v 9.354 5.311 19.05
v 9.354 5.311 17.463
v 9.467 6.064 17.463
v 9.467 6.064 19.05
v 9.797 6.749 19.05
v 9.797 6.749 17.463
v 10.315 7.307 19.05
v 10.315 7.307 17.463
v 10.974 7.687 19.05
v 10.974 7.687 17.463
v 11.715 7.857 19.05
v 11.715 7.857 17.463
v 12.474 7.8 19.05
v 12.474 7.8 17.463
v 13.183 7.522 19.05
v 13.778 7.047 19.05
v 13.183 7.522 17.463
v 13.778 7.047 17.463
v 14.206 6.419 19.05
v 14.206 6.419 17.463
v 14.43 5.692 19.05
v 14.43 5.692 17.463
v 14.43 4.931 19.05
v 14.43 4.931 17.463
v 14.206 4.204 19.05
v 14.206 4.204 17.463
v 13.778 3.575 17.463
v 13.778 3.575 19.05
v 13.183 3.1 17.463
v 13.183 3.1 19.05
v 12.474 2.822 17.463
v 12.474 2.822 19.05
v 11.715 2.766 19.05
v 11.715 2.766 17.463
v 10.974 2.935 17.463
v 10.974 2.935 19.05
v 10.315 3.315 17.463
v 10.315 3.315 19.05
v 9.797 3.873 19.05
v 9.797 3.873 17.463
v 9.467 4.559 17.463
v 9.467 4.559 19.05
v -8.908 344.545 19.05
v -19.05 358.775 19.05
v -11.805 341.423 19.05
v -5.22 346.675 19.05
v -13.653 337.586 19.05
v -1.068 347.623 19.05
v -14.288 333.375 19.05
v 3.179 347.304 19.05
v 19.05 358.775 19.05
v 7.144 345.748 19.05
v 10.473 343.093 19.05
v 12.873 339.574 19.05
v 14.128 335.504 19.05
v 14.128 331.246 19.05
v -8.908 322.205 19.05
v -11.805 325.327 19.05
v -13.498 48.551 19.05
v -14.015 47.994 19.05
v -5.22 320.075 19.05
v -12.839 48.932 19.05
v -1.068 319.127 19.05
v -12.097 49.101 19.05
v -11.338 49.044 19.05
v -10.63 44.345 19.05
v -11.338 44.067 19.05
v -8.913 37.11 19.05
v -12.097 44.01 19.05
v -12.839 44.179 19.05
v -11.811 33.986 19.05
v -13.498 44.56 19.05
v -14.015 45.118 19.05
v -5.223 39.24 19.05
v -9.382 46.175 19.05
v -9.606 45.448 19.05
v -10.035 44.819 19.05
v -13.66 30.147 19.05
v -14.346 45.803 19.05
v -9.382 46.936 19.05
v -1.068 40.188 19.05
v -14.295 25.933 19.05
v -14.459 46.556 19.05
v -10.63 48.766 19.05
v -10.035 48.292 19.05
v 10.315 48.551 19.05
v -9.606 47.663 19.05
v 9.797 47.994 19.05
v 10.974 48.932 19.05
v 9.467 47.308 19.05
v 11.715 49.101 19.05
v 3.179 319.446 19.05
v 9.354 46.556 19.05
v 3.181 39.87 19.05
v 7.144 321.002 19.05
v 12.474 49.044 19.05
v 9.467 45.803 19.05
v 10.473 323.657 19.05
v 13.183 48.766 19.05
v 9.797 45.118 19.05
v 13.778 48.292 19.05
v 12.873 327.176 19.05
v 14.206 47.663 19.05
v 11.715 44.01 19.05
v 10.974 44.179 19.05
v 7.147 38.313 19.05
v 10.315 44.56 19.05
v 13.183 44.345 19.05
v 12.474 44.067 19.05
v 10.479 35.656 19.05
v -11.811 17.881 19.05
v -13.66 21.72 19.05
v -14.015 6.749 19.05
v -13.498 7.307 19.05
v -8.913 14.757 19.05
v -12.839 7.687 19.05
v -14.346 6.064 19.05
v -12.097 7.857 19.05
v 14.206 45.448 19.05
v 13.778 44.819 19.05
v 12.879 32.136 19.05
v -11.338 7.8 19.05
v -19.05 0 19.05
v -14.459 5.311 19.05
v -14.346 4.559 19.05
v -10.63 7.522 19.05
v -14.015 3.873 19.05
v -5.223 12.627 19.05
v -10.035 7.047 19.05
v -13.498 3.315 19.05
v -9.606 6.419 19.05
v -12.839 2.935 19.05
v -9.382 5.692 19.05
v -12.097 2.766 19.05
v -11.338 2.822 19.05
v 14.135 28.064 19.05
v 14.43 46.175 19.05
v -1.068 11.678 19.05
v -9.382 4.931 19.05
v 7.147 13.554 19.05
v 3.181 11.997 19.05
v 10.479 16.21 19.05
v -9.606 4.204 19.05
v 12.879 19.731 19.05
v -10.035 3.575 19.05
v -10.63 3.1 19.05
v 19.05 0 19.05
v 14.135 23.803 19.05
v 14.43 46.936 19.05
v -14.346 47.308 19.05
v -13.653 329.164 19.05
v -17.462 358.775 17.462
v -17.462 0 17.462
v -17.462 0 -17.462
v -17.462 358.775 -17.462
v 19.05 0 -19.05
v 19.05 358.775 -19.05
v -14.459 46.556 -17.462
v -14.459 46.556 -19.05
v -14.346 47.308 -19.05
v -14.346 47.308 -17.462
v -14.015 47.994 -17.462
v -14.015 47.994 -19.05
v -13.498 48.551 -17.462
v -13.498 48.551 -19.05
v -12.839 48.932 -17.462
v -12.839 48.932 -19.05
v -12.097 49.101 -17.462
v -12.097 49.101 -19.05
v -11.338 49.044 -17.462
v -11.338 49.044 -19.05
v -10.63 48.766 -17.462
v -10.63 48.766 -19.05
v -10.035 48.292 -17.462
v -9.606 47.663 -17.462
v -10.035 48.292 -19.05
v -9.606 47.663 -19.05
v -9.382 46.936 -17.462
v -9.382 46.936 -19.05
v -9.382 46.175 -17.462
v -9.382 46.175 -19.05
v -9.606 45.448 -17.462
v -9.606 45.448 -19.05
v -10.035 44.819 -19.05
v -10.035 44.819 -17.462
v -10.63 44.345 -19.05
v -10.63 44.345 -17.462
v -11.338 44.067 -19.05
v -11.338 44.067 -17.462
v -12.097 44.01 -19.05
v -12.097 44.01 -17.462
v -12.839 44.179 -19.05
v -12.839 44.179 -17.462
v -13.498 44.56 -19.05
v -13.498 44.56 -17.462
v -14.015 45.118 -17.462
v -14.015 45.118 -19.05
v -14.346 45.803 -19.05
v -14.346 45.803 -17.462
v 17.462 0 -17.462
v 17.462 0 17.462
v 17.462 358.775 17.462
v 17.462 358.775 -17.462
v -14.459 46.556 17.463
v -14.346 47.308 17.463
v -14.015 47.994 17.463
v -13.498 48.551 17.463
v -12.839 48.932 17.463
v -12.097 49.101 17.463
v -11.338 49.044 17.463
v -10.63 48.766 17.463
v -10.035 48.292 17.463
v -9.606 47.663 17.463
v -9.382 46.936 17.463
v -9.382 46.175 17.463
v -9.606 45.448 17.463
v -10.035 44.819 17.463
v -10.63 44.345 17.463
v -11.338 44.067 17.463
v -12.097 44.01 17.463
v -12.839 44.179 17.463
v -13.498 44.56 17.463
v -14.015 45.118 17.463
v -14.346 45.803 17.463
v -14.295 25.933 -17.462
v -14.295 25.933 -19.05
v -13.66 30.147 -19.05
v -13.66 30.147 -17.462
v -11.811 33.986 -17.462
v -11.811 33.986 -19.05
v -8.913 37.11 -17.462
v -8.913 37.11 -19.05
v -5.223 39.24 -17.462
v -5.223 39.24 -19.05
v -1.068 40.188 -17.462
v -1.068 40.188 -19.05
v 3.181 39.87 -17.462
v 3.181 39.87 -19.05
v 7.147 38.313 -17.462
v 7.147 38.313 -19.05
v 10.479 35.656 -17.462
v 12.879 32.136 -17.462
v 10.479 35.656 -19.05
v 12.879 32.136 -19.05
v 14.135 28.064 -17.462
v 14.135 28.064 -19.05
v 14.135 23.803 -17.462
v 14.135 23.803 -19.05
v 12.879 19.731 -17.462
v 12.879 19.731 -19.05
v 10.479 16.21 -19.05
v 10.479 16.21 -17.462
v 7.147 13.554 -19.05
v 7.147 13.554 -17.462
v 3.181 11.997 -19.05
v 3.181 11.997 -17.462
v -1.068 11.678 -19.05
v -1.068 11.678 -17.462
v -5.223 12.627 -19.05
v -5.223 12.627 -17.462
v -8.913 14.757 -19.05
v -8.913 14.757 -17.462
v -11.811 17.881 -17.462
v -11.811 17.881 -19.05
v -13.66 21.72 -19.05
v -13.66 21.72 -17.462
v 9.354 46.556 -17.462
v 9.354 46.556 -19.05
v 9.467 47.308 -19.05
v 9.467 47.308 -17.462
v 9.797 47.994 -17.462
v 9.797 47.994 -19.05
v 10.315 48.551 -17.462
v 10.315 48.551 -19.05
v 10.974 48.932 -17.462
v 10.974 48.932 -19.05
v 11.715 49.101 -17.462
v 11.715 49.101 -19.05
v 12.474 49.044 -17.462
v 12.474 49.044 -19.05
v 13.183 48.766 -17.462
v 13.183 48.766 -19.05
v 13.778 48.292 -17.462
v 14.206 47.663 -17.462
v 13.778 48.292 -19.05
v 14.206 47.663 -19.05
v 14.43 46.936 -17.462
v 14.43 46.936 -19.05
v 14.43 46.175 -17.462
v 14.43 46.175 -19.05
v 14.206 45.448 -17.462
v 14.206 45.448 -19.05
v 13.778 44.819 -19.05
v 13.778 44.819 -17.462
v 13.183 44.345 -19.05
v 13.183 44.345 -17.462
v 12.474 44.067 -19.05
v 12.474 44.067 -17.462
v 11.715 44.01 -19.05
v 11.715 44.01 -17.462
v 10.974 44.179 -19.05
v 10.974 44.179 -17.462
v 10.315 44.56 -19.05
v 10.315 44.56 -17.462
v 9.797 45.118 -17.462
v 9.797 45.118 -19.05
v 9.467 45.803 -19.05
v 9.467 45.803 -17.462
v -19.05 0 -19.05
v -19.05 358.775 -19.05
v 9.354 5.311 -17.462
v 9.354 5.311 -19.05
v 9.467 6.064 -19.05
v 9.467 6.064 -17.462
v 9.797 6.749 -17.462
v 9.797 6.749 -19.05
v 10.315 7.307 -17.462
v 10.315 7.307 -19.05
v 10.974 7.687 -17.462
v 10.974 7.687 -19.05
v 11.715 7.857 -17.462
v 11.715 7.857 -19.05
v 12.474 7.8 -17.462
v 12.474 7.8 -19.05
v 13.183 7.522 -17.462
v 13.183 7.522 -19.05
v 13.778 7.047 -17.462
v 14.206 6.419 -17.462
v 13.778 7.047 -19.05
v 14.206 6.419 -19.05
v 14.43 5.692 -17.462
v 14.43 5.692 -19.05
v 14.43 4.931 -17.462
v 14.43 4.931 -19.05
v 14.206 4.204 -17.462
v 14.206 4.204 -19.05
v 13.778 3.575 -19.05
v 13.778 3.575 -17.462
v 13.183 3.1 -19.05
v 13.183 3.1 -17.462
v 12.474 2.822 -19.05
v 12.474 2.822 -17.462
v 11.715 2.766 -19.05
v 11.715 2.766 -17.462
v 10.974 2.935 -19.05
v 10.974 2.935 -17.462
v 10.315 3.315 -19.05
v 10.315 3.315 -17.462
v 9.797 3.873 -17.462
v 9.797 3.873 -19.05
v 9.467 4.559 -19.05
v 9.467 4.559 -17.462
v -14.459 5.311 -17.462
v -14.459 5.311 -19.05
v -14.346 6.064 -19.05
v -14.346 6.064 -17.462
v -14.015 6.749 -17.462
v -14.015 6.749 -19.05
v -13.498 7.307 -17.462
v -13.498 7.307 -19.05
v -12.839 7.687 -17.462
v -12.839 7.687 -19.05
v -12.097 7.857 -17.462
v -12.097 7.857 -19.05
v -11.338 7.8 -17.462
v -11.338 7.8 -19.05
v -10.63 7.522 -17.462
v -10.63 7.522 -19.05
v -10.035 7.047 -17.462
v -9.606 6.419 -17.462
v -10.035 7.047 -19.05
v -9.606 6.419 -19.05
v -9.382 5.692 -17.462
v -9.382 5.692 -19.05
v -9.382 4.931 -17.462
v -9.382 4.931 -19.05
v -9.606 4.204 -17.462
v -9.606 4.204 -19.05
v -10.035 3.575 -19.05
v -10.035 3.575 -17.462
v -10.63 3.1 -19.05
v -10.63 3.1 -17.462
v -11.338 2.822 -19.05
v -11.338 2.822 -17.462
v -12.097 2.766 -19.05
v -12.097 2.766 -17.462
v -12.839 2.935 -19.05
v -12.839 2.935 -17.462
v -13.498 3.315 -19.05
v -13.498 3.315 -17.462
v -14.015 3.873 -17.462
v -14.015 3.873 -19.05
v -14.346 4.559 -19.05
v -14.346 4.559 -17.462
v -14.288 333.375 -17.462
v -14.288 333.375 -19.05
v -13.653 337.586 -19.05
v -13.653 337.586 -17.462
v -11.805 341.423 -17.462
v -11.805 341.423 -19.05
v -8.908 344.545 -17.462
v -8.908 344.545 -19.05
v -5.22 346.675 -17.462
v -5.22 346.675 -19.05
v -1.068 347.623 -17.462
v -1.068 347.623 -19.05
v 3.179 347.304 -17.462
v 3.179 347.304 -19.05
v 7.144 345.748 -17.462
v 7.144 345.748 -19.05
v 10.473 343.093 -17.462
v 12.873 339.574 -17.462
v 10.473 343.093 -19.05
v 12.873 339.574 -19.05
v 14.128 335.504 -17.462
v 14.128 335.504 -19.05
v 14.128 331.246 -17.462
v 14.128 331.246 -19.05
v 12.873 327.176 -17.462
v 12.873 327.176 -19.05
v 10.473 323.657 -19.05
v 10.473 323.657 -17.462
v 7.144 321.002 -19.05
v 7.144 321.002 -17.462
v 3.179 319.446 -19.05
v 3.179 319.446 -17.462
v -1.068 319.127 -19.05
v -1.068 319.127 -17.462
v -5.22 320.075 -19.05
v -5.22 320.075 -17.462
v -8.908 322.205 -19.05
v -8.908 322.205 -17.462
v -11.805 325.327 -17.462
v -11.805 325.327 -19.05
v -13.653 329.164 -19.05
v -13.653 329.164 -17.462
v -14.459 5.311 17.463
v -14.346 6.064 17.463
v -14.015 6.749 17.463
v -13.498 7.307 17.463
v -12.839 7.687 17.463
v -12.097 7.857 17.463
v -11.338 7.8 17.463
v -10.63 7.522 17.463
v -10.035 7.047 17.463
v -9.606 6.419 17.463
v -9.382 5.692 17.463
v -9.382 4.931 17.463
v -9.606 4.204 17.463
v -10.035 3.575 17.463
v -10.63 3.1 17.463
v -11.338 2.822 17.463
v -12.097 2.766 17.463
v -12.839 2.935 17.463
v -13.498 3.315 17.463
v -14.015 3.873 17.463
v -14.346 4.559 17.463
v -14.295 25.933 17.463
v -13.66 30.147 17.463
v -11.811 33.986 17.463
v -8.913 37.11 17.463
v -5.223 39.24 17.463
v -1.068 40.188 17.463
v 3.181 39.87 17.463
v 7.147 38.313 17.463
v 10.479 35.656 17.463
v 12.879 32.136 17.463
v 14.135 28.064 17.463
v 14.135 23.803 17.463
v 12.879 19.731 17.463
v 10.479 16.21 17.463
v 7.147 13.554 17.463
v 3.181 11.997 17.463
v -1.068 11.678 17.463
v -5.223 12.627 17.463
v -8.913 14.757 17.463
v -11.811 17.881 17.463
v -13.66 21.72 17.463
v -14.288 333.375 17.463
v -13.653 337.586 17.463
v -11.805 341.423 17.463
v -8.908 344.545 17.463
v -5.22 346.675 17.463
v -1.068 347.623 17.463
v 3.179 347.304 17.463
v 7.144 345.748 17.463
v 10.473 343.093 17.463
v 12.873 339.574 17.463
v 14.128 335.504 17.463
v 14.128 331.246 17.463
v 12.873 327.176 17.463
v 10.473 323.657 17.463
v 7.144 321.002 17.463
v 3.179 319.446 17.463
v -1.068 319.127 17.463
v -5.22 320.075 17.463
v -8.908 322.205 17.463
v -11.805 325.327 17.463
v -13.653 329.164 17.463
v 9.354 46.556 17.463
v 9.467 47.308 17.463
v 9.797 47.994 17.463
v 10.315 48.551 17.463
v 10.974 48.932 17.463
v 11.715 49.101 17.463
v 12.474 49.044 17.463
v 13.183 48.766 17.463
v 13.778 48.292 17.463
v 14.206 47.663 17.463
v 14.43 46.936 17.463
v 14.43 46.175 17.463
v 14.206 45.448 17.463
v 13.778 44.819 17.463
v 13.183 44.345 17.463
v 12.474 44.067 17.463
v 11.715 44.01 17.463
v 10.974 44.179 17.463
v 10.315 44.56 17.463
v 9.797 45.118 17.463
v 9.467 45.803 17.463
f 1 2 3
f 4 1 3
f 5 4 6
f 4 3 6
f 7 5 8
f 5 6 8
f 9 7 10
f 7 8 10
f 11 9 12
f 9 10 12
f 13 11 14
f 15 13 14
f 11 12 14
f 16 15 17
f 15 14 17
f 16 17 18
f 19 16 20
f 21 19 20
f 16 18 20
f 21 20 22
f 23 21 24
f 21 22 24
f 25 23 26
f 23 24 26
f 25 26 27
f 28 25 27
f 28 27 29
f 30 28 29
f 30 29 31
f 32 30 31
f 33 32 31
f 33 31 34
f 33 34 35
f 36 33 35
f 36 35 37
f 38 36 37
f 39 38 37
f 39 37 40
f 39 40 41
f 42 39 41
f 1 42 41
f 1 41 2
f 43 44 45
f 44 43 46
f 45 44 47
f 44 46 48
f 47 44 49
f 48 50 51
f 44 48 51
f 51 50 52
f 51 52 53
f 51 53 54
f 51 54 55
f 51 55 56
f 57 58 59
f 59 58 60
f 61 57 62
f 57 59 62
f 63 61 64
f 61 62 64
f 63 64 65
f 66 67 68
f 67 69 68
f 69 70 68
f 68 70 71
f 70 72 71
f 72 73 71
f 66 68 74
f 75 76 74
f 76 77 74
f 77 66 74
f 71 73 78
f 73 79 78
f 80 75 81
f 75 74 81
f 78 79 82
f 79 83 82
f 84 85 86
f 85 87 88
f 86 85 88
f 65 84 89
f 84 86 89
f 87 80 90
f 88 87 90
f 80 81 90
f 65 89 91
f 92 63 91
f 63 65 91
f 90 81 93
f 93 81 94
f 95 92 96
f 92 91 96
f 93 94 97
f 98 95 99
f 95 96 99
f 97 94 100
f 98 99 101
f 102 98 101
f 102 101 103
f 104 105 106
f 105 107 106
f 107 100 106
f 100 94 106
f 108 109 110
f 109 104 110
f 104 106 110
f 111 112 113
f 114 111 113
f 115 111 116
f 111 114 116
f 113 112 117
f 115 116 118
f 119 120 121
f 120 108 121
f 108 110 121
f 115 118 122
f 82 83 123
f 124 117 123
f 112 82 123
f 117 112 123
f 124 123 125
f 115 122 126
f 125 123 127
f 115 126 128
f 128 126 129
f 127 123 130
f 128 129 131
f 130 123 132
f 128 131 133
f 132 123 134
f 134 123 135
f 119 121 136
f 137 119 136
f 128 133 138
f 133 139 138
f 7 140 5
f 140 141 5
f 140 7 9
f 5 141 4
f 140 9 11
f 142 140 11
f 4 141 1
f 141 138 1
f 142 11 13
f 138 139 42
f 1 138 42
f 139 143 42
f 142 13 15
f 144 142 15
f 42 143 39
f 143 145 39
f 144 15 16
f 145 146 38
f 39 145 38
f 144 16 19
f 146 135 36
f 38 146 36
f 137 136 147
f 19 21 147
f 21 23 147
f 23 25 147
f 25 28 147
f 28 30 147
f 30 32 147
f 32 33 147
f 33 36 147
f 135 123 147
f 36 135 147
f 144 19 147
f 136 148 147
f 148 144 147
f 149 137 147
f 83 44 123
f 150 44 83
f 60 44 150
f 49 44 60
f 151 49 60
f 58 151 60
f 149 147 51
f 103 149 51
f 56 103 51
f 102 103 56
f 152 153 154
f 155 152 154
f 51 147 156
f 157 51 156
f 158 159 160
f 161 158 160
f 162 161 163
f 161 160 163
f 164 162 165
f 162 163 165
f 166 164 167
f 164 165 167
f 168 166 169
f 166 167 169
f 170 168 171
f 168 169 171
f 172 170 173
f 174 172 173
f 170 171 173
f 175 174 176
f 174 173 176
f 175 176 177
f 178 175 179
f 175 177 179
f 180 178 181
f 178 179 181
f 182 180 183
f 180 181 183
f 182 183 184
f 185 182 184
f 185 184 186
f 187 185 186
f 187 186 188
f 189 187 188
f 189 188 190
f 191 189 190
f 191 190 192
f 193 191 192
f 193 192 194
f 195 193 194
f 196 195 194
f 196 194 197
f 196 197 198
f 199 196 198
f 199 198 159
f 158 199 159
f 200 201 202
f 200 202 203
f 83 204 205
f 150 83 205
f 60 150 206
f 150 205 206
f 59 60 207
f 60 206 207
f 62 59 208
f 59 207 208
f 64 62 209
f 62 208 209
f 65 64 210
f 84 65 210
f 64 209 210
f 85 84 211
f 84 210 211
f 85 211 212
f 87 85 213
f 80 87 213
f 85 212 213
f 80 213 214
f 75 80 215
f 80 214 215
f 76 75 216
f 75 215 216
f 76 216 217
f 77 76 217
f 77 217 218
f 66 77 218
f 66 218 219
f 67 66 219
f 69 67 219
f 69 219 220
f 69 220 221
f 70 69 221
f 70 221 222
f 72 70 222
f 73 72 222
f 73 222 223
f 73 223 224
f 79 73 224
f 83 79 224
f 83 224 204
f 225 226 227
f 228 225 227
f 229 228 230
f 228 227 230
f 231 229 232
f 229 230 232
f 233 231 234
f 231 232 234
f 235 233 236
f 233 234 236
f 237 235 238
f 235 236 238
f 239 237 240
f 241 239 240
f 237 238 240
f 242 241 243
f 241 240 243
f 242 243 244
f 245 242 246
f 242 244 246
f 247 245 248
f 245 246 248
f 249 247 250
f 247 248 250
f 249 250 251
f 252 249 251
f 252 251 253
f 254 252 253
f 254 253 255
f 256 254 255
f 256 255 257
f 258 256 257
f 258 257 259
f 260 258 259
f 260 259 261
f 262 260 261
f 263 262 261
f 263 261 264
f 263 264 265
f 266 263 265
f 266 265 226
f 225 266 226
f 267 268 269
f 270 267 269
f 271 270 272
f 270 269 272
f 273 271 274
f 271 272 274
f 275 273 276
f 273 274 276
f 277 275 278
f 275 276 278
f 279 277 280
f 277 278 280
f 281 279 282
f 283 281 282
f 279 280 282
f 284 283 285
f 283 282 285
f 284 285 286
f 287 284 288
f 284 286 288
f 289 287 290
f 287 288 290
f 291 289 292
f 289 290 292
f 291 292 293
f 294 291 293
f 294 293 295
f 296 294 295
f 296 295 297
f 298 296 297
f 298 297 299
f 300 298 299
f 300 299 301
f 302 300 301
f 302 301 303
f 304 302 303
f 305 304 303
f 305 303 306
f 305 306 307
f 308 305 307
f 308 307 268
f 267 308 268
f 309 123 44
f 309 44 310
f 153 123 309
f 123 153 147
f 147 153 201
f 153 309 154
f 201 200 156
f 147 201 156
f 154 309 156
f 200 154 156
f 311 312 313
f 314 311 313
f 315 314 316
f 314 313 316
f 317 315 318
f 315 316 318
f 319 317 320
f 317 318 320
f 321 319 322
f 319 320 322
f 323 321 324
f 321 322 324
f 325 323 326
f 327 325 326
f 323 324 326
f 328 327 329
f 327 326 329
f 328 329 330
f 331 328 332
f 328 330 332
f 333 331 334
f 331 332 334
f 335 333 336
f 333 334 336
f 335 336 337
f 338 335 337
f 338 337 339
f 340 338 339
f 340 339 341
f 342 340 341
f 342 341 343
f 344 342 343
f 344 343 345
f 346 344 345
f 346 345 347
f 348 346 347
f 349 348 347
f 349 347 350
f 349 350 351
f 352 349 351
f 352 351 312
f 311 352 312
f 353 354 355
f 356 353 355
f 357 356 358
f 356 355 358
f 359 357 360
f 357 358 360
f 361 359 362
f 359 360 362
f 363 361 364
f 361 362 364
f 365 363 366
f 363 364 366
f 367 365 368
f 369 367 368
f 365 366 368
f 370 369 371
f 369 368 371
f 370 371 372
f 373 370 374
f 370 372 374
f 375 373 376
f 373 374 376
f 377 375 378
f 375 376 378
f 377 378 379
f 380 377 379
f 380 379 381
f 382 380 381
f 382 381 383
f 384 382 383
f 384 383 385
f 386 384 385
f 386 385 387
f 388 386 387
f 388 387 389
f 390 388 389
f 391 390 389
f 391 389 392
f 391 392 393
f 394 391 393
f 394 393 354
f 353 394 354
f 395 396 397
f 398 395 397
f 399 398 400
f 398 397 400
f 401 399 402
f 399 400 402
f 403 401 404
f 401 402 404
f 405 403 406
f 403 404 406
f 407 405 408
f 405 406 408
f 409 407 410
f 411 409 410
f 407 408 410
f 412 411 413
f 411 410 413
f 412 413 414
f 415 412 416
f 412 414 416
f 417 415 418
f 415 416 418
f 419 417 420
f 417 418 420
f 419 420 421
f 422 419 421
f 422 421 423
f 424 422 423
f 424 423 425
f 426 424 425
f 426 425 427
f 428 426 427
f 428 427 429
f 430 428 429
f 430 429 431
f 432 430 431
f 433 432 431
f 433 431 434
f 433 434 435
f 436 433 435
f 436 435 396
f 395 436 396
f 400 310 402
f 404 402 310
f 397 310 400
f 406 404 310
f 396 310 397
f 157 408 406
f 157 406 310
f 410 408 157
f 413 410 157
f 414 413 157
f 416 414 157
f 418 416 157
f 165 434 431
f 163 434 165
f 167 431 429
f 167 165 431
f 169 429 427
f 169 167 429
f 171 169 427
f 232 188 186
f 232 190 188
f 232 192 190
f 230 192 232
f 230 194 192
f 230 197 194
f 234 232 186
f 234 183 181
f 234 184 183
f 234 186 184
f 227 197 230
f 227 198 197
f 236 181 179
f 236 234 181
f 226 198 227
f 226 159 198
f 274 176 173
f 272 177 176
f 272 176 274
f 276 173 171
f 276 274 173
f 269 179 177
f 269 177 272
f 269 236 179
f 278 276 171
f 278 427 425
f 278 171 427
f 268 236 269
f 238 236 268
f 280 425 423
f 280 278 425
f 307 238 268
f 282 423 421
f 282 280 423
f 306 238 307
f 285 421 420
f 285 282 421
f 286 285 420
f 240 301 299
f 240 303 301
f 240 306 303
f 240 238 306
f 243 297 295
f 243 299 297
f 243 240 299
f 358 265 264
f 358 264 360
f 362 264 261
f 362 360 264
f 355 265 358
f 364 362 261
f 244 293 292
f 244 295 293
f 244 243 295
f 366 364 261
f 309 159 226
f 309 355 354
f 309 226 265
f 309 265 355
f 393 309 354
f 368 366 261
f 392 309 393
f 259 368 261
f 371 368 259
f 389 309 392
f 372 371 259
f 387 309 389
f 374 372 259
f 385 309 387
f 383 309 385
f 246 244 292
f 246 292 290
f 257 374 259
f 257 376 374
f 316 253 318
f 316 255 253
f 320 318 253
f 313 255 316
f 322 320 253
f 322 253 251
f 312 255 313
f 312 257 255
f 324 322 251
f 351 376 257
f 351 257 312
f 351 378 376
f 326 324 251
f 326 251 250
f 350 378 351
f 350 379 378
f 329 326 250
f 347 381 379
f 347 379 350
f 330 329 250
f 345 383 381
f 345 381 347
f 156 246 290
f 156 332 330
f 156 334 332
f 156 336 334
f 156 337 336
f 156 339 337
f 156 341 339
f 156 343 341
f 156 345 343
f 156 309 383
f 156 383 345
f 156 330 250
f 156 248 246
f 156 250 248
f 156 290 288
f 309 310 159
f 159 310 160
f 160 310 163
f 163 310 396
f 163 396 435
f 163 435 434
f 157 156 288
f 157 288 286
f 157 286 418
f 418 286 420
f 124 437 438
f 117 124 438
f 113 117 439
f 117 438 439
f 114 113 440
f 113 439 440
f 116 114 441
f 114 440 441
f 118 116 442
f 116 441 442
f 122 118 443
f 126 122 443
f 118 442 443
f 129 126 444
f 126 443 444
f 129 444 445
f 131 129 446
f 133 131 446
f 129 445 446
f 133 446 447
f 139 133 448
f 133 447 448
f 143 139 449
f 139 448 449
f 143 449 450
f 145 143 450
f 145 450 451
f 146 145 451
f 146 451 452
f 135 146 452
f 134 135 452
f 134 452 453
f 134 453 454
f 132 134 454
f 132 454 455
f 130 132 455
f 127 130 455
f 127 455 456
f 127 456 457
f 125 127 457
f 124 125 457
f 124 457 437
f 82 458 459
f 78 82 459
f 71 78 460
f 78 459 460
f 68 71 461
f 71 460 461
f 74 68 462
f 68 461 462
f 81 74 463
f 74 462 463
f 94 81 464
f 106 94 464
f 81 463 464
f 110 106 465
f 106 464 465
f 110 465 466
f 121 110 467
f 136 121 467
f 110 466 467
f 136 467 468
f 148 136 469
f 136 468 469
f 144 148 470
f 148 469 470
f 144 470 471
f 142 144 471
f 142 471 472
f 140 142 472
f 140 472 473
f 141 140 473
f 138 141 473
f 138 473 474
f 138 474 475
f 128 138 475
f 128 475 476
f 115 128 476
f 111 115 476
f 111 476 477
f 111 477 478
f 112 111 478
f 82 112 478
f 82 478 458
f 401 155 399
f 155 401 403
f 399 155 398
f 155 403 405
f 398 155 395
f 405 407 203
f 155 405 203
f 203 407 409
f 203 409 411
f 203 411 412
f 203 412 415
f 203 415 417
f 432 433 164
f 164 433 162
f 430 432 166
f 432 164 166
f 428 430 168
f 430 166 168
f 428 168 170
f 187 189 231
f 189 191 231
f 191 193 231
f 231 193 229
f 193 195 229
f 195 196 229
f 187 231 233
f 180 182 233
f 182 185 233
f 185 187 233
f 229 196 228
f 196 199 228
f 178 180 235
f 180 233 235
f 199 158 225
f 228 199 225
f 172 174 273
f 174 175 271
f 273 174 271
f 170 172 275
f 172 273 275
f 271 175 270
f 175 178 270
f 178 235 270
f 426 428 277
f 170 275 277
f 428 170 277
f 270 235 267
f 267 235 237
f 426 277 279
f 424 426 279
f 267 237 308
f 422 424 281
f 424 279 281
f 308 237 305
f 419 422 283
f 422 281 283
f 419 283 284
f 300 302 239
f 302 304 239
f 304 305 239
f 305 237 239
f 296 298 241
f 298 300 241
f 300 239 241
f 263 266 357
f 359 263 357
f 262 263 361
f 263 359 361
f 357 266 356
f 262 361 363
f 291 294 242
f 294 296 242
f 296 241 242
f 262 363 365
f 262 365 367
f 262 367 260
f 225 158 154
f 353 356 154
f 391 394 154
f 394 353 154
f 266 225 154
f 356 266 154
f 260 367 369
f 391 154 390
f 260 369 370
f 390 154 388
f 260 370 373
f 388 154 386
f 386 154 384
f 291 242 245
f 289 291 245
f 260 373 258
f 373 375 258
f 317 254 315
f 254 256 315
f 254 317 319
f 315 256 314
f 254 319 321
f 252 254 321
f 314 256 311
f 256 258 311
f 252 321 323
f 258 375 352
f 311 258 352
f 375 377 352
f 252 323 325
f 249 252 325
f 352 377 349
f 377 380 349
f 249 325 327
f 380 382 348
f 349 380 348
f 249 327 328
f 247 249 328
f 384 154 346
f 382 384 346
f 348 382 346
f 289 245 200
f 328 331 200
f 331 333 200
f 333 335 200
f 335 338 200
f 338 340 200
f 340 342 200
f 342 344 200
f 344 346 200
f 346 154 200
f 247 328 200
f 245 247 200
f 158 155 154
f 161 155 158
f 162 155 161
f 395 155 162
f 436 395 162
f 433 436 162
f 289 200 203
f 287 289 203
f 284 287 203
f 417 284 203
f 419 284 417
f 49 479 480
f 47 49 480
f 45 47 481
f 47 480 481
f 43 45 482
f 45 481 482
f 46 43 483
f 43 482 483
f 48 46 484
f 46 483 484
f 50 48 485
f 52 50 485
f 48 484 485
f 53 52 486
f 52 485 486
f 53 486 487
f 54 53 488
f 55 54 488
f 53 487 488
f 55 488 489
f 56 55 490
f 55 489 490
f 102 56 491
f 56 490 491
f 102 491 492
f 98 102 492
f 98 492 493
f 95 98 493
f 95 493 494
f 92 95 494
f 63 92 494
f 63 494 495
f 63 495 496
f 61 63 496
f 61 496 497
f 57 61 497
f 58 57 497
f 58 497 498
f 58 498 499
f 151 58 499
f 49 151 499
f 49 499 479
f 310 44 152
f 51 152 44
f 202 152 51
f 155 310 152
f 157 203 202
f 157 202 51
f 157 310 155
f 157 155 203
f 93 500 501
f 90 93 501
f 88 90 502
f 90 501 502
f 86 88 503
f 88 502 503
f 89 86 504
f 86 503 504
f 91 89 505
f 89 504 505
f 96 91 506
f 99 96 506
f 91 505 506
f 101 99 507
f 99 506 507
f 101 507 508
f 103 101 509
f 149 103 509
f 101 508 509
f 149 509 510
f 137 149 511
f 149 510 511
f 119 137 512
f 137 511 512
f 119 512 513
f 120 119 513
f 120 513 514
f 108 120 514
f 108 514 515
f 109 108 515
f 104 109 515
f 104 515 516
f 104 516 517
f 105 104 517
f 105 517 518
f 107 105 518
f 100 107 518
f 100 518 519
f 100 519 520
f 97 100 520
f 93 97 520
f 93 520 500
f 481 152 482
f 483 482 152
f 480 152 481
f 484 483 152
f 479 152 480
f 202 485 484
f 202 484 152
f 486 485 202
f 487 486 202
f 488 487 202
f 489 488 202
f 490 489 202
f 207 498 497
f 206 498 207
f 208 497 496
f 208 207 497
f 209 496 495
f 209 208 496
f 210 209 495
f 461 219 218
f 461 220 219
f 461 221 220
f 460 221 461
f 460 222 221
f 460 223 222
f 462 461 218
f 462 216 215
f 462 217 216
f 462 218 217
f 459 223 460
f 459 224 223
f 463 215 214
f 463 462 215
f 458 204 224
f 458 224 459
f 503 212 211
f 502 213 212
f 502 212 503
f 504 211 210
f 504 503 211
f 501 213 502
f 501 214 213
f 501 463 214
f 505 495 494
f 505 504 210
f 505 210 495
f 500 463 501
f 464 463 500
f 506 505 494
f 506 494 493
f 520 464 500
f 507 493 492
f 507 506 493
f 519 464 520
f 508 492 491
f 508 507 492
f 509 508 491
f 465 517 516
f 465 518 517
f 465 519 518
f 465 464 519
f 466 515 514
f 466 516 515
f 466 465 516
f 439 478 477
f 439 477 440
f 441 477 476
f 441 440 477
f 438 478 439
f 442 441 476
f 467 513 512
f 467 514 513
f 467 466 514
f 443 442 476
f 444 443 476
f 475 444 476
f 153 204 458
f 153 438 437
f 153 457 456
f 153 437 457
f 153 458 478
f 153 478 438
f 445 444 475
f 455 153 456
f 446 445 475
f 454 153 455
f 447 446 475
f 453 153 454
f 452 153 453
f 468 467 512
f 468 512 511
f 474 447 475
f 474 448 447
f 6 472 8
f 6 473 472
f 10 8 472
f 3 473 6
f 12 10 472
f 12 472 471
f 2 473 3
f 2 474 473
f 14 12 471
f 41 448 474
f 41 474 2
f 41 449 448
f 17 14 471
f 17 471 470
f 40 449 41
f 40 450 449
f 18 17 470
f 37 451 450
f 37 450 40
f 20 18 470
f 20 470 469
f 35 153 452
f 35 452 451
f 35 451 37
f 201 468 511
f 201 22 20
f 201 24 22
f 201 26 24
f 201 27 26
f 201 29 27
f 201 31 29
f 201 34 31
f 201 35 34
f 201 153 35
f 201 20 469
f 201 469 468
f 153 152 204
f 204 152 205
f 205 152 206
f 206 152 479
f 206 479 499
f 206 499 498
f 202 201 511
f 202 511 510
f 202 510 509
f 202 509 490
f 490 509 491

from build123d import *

# Parameters (mm, degrees)
SKETCH1_W           = 38.1
SKETCH1_H           = 38.1
SKETCH1_W_2         = 34.925
SKETCH1_H_2         = 34.925
BOSS_EXTRUDE1_DEPTH = 358.775
SKETCH2_R           = 14.2875
SKETCH2_R_2         = 2.5527
SKETCH2_R_3         = 14.294919975
CUT_EXTRUDE1_DEPTH  = 362.294911568


with BuildPart() as part:
    # Sketch1 → Boss-Extrude1 (new body)
    with BuildSketch(Plane(origin=(0, 0, 0), x_dir=(1, 0, 0), z_dir=(0, 1, 0))):
        Rectangle(SKETCH1_W, SKETCH1_H)
        Rectangle(SKETCH1_W_2, SKETCH1_H_2, mode=Mode.SUBTRACT)
    extrude(amount=BOSS_EXTRUDE1_DEPTH)

    # Sketch2 → Cut-Extrude1 (cut, through all)
    with BuildSketch(Plane(origin=(0, 0, -19.05), x_dir=(-1, 0, 0), z_dir=(0, 0, -1))):
        with Locations((0, 333.375)):
            Circle(SKETCH2_R)
        with Locations((-11.90625, 5.311170072)):
            Circle(SKETCH2_R_2)
        with Locations((-11.90625, 46.555629928)):
            Circle(SKETCH2_R_2)
        with Locations((11.90625, 46.555629928)):
            Circle(SKETCH2_R_2)
        with Locations((11.90625, 5.311170072)):
            Circle(SKETCH2_R_2)
        with Locations((0, 25.9334)):
            Circle(SKETCH2_R_3)
    extrude(amount=-CUT_EXTRUDE1_DEPTH, mode=Mode.SUBTRACT)


solid = part.part
